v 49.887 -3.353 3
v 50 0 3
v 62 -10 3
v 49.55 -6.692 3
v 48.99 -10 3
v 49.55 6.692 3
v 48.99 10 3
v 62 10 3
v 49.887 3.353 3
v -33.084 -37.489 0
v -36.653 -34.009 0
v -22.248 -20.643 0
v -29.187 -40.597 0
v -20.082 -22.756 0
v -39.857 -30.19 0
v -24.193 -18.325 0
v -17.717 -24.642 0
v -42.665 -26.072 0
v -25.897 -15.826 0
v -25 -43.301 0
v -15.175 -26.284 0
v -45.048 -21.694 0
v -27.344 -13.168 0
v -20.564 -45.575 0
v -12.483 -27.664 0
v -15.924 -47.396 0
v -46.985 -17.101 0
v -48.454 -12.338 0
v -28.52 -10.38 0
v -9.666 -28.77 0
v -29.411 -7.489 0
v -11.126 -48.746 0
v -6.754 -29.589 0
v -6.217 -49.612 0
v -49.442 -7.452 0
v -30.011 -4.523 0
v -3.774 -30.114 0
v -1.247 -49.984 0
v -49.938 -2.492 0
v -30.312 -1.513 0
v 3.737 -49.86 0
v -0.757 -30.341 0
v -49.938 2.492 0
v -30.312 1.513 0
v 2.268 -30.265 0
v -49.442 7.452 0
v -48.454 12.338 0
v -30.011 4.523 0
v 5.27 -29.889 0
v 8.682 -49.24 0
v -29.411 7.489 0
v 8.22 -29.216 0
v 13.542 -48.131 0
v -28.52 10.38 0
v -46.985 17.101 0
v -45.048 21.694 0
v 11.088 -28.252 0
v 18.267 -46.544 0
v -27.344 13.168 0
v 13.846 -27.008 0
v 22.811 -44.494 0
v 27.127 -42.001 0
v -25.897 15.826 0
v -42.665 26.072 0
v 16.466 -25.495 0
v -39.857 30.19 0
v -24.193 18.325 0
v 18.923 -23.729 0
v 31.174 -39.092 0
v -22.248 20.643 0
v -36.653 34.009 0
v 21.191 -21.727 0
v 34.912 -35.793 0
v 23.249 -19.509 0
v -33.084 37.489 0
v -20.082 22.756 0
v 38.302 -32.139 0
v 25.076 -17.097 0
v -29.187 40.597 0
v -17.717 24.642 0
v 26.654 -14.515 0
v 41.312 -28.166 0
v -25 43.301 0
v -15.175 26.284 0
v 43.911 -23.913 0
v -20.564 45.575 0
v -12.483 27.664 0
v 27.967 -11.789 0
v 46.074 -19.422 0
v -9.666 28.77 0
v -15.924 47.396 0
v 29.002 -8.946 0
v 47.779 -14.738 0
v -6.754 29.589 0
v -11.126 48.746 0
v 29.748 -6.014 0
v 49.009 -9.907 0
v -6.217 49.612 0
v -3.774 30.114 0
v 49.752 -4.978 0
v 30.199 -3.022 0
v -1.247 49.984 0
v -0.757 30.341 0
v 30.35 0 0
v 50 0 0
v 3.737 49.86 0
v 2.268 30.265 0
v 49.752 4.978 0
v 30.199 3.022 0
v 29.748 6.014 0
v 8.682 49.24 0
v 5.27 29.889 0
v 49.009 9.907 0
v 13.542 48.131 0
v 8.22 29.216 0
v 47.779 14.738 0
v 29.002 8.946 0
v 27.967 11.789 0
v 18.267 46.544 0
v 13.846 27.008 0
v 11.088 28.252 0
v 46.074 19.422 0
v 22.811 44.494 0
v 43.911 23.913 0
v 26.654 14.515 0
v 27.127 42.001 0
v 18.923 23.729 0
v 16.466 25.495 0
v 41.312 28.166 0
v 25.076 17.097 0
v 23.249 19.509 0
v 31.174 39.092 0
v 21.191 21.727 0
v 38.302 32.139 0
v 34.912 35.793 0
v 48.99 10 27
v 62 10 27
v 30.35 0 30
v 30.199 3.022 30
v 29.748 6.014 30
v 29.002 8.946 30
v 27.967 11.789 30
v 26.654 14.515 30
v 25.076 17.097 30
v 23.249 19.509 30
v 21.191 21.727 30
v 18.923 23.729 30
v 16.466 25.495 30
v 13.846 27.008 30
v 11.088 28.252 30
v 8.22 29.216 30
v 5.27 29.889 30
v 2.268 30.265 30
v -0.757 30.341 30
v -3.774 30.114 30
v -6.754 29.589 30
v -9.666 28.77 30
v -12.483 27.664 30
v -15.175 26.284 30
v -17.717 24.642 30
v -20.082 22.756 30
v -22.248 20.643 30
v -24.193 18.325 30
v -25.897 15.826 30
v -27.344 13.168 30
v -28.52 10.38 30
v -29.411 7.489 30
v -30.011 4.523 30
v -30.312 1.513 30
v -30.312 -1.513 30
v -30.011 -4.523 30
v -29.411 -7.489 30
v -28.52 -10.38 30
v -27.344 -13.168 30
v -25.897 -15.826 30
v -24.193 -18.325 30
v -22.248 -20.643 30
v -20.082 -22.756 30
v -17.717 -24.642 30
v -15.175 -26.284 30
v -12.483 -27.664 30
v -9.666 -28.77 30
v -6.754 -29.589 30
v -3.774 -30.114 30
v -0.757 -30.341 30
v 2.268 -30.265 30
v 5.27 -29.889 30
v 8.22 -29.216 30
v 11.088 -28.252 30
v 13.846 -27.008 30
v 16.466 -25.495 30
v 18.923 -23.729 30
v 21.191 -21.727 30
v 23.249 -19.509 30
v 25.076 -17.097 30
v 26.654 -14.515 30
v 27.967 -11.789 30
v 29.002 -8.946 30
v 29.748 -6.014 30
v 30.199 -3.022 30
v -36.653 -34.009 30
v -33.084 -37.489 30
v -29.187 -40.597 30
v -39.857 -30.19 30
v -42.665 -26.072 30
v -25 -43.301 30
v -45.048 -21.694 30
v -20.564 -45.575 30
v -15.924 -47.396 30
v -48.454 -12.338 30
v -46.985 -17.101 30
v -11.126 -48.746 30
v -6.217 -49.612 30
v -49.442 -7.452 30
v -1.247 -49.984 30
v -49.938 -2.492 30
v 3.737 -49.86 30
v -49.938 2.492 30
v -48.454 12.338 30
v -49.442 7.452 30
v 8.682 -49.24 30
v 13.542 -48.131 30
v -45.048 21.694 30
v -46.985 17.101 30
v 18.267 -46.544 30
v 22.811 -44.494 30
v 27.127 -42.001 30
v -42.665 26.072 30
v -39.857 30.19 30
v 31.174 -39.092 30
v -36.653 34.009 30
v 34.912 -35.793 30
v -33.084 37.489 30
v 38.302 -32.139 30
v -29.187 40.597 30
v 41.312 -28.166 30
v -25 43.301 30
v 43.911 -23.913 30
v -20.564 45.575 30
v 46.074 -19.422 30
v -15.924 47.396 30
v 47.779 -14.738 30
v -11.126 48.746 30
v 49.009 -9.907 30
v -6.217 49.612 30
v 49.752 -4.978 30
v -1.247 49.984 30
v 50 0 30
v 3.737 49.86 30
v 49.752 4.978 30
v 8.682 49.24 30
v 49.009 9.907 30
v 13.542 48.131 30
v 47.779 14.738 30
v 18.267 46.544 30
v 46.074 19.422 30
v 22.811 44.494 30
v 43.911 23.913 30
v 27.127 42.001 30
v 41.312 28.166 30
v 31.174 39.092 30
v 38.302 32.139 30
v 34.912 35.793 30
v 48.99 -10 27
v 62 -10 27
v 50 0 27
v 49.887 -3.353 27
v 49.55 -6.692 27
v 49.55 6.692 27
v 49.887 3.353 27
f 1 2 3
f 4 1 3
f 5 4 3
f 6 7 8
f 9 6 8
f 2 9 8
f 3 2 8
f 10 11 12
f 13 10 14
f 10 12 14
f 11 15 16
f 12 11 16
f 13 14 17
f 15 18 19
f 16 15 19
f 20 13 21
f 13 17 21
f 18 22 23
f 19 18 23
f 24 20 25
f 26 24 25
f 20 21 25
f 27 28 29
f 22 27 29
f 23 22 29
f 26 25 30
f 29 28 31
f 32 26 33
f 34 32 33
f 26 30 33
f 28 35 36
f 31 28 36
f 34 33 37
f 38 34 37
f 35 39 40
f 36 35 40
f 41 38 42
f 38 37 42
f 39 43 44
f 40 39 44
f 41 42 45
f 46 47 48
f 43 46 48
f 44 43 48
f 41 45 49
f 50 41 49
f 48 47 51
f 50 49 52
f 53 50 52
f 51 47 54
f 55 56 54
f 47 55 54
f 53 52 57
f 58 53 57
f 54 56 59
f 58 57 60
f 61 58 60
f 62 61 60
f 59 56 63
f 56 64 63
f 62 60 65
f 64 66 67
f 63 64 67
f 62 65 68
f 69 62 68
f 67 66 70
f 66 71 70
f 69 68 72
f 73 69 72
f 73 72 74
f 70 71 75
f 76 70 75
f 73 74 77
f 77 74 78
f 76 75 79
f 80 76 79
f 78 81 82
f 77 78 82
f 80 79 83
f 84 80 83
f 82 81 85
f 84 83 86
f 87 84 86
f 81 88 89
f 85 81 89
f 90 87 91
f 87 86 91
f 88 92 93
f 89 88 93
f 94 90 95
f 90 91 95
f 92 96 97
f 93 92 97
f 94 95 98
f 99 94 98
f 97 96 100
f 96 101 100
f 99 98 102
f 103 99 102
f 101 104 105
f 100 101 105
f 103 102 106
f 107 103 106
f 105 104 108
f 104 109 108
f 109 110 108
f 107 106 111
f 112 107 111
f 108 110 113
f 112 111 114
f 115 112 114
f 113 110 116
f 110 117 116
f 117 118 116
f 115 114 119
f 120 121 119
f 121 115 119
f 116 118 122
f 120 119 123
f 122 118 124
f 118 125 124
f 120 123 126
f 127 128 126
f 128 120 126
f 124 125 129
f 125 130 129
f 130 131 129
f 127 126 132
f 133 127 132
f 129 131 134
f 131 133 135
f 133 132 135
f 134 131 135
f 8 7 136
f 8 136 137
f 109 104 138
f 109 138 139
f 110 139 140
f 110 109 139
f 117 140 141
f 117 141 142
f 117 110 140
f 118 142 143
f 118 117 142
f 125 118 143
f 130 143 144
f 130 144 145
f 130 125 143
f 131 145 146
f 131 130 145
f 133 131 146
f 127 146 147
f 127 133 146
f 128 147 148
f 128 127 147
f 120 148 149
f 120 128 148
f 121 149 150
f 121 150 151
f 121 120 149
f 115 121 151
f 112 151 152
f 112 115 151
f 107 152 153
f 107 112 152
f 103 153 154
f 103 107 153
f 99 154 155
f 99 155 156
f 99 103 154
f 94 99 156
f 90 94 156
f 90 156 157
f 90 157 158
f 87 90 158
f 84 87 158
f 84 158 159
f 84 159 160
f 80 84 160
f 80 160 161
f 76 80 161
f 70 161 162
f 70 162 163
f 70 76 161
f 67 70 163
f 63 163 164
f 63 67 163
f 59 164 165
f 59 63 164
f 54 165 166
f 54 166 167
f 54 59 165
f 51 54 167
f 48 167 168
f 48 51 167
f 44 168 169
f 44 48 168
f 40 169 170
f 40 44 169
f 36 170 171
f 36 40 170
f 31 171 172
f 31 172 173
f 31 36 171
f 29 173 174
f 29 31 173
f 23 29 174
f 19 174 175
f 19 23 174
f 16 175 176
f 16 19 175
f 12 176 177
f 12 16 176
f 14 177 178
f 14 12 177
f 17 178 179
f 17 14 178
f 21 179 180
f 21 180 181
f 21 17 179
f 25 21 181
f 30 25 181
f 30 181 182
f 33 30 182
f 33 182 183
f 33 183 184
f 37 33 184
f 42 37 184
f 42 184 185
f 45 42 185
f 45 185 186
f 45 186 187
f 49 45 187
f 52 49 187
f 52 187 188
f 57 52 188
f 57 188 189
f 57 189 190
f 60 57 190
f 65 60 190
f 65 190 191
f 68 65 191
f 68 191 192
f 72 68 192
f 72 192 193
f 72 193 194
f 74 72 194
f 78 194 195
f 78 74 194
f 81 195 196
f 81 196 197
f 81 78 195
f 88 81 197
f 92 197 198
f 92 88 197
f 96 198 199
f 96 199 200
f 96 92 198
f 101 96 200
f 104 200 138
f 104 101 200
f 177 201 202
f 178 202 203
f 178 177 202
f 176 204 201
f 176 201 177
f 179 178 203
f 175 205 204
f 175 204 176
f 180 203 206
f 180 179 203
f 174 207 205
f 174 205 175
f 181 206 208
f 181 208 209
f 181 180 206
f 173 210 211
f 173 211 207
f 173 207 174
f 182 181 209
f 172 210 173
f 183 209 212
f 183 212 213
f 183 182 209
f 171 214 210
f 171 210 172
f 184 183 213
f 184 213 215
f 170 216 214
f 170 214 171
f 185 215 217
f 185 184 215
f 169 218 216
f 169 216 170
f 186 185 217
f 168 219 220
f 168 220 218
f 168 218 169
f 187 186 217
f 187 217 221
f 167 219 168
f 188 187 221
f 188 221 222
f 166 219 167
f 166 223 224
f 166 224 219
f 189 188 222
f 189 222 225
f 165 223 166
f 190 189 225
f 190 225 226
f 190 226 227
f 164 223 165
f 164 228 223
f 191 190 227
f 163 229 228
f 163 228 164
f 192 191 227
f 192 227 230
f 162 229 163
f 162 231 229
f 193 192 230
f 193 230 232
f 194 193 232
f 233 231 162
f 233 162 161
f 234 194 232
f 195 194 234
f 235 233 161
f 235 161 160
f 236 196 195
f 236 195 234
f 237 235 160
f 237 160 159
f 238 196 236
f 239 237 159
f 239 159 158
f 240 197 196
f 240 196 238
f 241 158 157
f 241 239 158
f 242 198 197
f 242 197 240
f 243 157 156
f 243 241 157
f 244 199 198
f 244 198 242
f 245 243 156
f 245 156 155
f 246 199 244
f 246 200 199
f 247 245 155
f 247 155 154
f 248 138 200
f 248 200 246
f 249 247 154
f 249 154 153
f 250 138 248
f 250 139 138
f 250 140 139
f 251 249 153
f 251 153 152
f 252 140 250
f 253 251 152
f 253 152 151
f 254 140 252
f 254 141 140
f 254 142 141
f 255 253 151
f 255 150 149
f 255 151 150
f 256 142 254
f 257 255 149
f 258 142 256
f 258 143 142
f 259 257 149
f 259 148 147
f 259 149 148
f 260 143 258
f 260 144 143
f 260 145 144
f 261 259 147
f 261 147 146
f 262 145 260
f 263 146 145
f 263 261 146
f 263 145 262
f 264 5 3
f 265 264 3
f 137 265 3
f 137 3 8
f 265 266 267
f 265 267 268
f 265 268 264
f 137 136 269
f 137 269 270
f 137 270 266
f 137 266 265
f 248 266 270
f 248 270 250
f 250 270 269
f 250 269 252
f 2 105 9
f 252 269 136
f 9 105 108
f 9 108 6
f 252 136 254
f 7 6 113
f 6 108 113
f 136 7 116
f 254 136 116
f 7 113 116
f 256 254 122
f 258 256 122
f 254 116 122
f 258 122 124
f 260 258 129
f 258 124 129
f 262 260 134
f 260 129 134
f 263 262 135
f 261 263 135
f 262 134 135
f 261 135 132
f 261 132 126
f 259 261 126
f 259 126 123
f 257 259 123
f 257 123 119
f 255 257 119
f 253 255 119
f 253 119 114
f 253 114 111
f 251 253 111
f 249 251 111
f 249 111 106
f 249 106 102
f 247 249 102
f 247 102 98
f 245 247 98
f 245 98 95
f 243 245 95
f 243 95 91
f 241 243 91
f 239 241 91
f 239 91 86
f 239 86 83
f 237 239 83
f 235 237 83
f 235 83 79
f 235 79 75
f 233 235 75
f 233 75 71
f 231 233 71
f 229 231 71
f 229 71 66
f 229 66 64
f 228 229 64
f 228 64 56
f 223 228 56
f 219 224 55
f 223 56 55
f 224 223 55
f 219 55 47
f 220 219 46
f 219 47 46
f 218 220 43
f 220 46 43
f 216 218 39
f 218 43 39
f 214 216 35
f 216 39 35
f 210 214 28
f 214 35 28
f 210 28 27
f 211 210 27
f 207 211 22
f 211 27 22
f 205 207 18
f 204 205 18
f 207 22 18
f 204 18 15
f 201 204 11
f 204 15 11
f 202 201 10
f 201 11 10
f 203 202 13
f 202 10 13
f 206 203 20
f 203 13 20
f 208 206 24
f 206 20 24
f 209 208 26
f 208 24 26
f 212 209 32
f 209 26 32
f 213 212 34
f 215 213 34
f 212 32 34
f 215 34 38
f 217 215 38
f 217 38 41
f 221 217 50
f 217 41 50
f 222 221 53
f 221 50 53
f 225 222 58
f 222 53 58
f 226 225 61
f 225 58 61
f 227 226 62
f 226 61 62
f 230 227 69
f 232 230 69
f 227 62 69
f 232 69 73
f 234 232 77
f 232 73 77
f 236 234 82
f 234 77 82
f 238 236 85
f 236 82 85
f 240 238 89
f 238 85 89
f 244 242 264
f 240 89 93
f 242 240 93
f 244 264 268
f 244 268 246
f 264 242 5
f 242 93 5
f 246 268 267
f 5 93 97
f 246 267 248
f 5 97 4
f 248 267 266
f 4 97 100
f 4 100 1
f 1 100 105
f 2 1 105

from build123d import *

# Parameters (mm, degrees)
EXTRUDE_SKETCH_1_R   = 50
EXTRUDE_SKETCH_1_R_2 = 30.35
EXTRUDE_1_DEPTH      = 30
EXTRUDE_START        = 3
EXTRUDE_SKETCH_2_W   = 16
EXTRUDE_SKETCH_2_H   = 20
EXTRUDE_2_DEPTH      = 24


with BuildPart() as part:
    # Extrude sketch 1 → Extrude 1 (new body)
    with BuildSketch(Plane.XY):
        Circle(EXTRUDE_SKETCH_1_R)
        Circle(EXTRUDE_SKETCH_1_R_2, mode=Mode.SUBTRACT)
    extrude(amount=EXTRUDE_1_DEPTH)


with BuildPart() as body_2:
    # Extrude sketch 2 → Extrude 2 (new body)
    with BuildSketch(Plane.XY.offset(EXTRUDE_START)):
        with Locations((54, 0)):
            Rectangle(EXTRUDE_SKETCH_2_W, EXTRUDE_SKETCH_2_H)
    extrude(amount=EXTRUDE_2_DEPTH)

    # Combine (weld / assembly of features): union part
    add(part.part)


solid = body_2.part
